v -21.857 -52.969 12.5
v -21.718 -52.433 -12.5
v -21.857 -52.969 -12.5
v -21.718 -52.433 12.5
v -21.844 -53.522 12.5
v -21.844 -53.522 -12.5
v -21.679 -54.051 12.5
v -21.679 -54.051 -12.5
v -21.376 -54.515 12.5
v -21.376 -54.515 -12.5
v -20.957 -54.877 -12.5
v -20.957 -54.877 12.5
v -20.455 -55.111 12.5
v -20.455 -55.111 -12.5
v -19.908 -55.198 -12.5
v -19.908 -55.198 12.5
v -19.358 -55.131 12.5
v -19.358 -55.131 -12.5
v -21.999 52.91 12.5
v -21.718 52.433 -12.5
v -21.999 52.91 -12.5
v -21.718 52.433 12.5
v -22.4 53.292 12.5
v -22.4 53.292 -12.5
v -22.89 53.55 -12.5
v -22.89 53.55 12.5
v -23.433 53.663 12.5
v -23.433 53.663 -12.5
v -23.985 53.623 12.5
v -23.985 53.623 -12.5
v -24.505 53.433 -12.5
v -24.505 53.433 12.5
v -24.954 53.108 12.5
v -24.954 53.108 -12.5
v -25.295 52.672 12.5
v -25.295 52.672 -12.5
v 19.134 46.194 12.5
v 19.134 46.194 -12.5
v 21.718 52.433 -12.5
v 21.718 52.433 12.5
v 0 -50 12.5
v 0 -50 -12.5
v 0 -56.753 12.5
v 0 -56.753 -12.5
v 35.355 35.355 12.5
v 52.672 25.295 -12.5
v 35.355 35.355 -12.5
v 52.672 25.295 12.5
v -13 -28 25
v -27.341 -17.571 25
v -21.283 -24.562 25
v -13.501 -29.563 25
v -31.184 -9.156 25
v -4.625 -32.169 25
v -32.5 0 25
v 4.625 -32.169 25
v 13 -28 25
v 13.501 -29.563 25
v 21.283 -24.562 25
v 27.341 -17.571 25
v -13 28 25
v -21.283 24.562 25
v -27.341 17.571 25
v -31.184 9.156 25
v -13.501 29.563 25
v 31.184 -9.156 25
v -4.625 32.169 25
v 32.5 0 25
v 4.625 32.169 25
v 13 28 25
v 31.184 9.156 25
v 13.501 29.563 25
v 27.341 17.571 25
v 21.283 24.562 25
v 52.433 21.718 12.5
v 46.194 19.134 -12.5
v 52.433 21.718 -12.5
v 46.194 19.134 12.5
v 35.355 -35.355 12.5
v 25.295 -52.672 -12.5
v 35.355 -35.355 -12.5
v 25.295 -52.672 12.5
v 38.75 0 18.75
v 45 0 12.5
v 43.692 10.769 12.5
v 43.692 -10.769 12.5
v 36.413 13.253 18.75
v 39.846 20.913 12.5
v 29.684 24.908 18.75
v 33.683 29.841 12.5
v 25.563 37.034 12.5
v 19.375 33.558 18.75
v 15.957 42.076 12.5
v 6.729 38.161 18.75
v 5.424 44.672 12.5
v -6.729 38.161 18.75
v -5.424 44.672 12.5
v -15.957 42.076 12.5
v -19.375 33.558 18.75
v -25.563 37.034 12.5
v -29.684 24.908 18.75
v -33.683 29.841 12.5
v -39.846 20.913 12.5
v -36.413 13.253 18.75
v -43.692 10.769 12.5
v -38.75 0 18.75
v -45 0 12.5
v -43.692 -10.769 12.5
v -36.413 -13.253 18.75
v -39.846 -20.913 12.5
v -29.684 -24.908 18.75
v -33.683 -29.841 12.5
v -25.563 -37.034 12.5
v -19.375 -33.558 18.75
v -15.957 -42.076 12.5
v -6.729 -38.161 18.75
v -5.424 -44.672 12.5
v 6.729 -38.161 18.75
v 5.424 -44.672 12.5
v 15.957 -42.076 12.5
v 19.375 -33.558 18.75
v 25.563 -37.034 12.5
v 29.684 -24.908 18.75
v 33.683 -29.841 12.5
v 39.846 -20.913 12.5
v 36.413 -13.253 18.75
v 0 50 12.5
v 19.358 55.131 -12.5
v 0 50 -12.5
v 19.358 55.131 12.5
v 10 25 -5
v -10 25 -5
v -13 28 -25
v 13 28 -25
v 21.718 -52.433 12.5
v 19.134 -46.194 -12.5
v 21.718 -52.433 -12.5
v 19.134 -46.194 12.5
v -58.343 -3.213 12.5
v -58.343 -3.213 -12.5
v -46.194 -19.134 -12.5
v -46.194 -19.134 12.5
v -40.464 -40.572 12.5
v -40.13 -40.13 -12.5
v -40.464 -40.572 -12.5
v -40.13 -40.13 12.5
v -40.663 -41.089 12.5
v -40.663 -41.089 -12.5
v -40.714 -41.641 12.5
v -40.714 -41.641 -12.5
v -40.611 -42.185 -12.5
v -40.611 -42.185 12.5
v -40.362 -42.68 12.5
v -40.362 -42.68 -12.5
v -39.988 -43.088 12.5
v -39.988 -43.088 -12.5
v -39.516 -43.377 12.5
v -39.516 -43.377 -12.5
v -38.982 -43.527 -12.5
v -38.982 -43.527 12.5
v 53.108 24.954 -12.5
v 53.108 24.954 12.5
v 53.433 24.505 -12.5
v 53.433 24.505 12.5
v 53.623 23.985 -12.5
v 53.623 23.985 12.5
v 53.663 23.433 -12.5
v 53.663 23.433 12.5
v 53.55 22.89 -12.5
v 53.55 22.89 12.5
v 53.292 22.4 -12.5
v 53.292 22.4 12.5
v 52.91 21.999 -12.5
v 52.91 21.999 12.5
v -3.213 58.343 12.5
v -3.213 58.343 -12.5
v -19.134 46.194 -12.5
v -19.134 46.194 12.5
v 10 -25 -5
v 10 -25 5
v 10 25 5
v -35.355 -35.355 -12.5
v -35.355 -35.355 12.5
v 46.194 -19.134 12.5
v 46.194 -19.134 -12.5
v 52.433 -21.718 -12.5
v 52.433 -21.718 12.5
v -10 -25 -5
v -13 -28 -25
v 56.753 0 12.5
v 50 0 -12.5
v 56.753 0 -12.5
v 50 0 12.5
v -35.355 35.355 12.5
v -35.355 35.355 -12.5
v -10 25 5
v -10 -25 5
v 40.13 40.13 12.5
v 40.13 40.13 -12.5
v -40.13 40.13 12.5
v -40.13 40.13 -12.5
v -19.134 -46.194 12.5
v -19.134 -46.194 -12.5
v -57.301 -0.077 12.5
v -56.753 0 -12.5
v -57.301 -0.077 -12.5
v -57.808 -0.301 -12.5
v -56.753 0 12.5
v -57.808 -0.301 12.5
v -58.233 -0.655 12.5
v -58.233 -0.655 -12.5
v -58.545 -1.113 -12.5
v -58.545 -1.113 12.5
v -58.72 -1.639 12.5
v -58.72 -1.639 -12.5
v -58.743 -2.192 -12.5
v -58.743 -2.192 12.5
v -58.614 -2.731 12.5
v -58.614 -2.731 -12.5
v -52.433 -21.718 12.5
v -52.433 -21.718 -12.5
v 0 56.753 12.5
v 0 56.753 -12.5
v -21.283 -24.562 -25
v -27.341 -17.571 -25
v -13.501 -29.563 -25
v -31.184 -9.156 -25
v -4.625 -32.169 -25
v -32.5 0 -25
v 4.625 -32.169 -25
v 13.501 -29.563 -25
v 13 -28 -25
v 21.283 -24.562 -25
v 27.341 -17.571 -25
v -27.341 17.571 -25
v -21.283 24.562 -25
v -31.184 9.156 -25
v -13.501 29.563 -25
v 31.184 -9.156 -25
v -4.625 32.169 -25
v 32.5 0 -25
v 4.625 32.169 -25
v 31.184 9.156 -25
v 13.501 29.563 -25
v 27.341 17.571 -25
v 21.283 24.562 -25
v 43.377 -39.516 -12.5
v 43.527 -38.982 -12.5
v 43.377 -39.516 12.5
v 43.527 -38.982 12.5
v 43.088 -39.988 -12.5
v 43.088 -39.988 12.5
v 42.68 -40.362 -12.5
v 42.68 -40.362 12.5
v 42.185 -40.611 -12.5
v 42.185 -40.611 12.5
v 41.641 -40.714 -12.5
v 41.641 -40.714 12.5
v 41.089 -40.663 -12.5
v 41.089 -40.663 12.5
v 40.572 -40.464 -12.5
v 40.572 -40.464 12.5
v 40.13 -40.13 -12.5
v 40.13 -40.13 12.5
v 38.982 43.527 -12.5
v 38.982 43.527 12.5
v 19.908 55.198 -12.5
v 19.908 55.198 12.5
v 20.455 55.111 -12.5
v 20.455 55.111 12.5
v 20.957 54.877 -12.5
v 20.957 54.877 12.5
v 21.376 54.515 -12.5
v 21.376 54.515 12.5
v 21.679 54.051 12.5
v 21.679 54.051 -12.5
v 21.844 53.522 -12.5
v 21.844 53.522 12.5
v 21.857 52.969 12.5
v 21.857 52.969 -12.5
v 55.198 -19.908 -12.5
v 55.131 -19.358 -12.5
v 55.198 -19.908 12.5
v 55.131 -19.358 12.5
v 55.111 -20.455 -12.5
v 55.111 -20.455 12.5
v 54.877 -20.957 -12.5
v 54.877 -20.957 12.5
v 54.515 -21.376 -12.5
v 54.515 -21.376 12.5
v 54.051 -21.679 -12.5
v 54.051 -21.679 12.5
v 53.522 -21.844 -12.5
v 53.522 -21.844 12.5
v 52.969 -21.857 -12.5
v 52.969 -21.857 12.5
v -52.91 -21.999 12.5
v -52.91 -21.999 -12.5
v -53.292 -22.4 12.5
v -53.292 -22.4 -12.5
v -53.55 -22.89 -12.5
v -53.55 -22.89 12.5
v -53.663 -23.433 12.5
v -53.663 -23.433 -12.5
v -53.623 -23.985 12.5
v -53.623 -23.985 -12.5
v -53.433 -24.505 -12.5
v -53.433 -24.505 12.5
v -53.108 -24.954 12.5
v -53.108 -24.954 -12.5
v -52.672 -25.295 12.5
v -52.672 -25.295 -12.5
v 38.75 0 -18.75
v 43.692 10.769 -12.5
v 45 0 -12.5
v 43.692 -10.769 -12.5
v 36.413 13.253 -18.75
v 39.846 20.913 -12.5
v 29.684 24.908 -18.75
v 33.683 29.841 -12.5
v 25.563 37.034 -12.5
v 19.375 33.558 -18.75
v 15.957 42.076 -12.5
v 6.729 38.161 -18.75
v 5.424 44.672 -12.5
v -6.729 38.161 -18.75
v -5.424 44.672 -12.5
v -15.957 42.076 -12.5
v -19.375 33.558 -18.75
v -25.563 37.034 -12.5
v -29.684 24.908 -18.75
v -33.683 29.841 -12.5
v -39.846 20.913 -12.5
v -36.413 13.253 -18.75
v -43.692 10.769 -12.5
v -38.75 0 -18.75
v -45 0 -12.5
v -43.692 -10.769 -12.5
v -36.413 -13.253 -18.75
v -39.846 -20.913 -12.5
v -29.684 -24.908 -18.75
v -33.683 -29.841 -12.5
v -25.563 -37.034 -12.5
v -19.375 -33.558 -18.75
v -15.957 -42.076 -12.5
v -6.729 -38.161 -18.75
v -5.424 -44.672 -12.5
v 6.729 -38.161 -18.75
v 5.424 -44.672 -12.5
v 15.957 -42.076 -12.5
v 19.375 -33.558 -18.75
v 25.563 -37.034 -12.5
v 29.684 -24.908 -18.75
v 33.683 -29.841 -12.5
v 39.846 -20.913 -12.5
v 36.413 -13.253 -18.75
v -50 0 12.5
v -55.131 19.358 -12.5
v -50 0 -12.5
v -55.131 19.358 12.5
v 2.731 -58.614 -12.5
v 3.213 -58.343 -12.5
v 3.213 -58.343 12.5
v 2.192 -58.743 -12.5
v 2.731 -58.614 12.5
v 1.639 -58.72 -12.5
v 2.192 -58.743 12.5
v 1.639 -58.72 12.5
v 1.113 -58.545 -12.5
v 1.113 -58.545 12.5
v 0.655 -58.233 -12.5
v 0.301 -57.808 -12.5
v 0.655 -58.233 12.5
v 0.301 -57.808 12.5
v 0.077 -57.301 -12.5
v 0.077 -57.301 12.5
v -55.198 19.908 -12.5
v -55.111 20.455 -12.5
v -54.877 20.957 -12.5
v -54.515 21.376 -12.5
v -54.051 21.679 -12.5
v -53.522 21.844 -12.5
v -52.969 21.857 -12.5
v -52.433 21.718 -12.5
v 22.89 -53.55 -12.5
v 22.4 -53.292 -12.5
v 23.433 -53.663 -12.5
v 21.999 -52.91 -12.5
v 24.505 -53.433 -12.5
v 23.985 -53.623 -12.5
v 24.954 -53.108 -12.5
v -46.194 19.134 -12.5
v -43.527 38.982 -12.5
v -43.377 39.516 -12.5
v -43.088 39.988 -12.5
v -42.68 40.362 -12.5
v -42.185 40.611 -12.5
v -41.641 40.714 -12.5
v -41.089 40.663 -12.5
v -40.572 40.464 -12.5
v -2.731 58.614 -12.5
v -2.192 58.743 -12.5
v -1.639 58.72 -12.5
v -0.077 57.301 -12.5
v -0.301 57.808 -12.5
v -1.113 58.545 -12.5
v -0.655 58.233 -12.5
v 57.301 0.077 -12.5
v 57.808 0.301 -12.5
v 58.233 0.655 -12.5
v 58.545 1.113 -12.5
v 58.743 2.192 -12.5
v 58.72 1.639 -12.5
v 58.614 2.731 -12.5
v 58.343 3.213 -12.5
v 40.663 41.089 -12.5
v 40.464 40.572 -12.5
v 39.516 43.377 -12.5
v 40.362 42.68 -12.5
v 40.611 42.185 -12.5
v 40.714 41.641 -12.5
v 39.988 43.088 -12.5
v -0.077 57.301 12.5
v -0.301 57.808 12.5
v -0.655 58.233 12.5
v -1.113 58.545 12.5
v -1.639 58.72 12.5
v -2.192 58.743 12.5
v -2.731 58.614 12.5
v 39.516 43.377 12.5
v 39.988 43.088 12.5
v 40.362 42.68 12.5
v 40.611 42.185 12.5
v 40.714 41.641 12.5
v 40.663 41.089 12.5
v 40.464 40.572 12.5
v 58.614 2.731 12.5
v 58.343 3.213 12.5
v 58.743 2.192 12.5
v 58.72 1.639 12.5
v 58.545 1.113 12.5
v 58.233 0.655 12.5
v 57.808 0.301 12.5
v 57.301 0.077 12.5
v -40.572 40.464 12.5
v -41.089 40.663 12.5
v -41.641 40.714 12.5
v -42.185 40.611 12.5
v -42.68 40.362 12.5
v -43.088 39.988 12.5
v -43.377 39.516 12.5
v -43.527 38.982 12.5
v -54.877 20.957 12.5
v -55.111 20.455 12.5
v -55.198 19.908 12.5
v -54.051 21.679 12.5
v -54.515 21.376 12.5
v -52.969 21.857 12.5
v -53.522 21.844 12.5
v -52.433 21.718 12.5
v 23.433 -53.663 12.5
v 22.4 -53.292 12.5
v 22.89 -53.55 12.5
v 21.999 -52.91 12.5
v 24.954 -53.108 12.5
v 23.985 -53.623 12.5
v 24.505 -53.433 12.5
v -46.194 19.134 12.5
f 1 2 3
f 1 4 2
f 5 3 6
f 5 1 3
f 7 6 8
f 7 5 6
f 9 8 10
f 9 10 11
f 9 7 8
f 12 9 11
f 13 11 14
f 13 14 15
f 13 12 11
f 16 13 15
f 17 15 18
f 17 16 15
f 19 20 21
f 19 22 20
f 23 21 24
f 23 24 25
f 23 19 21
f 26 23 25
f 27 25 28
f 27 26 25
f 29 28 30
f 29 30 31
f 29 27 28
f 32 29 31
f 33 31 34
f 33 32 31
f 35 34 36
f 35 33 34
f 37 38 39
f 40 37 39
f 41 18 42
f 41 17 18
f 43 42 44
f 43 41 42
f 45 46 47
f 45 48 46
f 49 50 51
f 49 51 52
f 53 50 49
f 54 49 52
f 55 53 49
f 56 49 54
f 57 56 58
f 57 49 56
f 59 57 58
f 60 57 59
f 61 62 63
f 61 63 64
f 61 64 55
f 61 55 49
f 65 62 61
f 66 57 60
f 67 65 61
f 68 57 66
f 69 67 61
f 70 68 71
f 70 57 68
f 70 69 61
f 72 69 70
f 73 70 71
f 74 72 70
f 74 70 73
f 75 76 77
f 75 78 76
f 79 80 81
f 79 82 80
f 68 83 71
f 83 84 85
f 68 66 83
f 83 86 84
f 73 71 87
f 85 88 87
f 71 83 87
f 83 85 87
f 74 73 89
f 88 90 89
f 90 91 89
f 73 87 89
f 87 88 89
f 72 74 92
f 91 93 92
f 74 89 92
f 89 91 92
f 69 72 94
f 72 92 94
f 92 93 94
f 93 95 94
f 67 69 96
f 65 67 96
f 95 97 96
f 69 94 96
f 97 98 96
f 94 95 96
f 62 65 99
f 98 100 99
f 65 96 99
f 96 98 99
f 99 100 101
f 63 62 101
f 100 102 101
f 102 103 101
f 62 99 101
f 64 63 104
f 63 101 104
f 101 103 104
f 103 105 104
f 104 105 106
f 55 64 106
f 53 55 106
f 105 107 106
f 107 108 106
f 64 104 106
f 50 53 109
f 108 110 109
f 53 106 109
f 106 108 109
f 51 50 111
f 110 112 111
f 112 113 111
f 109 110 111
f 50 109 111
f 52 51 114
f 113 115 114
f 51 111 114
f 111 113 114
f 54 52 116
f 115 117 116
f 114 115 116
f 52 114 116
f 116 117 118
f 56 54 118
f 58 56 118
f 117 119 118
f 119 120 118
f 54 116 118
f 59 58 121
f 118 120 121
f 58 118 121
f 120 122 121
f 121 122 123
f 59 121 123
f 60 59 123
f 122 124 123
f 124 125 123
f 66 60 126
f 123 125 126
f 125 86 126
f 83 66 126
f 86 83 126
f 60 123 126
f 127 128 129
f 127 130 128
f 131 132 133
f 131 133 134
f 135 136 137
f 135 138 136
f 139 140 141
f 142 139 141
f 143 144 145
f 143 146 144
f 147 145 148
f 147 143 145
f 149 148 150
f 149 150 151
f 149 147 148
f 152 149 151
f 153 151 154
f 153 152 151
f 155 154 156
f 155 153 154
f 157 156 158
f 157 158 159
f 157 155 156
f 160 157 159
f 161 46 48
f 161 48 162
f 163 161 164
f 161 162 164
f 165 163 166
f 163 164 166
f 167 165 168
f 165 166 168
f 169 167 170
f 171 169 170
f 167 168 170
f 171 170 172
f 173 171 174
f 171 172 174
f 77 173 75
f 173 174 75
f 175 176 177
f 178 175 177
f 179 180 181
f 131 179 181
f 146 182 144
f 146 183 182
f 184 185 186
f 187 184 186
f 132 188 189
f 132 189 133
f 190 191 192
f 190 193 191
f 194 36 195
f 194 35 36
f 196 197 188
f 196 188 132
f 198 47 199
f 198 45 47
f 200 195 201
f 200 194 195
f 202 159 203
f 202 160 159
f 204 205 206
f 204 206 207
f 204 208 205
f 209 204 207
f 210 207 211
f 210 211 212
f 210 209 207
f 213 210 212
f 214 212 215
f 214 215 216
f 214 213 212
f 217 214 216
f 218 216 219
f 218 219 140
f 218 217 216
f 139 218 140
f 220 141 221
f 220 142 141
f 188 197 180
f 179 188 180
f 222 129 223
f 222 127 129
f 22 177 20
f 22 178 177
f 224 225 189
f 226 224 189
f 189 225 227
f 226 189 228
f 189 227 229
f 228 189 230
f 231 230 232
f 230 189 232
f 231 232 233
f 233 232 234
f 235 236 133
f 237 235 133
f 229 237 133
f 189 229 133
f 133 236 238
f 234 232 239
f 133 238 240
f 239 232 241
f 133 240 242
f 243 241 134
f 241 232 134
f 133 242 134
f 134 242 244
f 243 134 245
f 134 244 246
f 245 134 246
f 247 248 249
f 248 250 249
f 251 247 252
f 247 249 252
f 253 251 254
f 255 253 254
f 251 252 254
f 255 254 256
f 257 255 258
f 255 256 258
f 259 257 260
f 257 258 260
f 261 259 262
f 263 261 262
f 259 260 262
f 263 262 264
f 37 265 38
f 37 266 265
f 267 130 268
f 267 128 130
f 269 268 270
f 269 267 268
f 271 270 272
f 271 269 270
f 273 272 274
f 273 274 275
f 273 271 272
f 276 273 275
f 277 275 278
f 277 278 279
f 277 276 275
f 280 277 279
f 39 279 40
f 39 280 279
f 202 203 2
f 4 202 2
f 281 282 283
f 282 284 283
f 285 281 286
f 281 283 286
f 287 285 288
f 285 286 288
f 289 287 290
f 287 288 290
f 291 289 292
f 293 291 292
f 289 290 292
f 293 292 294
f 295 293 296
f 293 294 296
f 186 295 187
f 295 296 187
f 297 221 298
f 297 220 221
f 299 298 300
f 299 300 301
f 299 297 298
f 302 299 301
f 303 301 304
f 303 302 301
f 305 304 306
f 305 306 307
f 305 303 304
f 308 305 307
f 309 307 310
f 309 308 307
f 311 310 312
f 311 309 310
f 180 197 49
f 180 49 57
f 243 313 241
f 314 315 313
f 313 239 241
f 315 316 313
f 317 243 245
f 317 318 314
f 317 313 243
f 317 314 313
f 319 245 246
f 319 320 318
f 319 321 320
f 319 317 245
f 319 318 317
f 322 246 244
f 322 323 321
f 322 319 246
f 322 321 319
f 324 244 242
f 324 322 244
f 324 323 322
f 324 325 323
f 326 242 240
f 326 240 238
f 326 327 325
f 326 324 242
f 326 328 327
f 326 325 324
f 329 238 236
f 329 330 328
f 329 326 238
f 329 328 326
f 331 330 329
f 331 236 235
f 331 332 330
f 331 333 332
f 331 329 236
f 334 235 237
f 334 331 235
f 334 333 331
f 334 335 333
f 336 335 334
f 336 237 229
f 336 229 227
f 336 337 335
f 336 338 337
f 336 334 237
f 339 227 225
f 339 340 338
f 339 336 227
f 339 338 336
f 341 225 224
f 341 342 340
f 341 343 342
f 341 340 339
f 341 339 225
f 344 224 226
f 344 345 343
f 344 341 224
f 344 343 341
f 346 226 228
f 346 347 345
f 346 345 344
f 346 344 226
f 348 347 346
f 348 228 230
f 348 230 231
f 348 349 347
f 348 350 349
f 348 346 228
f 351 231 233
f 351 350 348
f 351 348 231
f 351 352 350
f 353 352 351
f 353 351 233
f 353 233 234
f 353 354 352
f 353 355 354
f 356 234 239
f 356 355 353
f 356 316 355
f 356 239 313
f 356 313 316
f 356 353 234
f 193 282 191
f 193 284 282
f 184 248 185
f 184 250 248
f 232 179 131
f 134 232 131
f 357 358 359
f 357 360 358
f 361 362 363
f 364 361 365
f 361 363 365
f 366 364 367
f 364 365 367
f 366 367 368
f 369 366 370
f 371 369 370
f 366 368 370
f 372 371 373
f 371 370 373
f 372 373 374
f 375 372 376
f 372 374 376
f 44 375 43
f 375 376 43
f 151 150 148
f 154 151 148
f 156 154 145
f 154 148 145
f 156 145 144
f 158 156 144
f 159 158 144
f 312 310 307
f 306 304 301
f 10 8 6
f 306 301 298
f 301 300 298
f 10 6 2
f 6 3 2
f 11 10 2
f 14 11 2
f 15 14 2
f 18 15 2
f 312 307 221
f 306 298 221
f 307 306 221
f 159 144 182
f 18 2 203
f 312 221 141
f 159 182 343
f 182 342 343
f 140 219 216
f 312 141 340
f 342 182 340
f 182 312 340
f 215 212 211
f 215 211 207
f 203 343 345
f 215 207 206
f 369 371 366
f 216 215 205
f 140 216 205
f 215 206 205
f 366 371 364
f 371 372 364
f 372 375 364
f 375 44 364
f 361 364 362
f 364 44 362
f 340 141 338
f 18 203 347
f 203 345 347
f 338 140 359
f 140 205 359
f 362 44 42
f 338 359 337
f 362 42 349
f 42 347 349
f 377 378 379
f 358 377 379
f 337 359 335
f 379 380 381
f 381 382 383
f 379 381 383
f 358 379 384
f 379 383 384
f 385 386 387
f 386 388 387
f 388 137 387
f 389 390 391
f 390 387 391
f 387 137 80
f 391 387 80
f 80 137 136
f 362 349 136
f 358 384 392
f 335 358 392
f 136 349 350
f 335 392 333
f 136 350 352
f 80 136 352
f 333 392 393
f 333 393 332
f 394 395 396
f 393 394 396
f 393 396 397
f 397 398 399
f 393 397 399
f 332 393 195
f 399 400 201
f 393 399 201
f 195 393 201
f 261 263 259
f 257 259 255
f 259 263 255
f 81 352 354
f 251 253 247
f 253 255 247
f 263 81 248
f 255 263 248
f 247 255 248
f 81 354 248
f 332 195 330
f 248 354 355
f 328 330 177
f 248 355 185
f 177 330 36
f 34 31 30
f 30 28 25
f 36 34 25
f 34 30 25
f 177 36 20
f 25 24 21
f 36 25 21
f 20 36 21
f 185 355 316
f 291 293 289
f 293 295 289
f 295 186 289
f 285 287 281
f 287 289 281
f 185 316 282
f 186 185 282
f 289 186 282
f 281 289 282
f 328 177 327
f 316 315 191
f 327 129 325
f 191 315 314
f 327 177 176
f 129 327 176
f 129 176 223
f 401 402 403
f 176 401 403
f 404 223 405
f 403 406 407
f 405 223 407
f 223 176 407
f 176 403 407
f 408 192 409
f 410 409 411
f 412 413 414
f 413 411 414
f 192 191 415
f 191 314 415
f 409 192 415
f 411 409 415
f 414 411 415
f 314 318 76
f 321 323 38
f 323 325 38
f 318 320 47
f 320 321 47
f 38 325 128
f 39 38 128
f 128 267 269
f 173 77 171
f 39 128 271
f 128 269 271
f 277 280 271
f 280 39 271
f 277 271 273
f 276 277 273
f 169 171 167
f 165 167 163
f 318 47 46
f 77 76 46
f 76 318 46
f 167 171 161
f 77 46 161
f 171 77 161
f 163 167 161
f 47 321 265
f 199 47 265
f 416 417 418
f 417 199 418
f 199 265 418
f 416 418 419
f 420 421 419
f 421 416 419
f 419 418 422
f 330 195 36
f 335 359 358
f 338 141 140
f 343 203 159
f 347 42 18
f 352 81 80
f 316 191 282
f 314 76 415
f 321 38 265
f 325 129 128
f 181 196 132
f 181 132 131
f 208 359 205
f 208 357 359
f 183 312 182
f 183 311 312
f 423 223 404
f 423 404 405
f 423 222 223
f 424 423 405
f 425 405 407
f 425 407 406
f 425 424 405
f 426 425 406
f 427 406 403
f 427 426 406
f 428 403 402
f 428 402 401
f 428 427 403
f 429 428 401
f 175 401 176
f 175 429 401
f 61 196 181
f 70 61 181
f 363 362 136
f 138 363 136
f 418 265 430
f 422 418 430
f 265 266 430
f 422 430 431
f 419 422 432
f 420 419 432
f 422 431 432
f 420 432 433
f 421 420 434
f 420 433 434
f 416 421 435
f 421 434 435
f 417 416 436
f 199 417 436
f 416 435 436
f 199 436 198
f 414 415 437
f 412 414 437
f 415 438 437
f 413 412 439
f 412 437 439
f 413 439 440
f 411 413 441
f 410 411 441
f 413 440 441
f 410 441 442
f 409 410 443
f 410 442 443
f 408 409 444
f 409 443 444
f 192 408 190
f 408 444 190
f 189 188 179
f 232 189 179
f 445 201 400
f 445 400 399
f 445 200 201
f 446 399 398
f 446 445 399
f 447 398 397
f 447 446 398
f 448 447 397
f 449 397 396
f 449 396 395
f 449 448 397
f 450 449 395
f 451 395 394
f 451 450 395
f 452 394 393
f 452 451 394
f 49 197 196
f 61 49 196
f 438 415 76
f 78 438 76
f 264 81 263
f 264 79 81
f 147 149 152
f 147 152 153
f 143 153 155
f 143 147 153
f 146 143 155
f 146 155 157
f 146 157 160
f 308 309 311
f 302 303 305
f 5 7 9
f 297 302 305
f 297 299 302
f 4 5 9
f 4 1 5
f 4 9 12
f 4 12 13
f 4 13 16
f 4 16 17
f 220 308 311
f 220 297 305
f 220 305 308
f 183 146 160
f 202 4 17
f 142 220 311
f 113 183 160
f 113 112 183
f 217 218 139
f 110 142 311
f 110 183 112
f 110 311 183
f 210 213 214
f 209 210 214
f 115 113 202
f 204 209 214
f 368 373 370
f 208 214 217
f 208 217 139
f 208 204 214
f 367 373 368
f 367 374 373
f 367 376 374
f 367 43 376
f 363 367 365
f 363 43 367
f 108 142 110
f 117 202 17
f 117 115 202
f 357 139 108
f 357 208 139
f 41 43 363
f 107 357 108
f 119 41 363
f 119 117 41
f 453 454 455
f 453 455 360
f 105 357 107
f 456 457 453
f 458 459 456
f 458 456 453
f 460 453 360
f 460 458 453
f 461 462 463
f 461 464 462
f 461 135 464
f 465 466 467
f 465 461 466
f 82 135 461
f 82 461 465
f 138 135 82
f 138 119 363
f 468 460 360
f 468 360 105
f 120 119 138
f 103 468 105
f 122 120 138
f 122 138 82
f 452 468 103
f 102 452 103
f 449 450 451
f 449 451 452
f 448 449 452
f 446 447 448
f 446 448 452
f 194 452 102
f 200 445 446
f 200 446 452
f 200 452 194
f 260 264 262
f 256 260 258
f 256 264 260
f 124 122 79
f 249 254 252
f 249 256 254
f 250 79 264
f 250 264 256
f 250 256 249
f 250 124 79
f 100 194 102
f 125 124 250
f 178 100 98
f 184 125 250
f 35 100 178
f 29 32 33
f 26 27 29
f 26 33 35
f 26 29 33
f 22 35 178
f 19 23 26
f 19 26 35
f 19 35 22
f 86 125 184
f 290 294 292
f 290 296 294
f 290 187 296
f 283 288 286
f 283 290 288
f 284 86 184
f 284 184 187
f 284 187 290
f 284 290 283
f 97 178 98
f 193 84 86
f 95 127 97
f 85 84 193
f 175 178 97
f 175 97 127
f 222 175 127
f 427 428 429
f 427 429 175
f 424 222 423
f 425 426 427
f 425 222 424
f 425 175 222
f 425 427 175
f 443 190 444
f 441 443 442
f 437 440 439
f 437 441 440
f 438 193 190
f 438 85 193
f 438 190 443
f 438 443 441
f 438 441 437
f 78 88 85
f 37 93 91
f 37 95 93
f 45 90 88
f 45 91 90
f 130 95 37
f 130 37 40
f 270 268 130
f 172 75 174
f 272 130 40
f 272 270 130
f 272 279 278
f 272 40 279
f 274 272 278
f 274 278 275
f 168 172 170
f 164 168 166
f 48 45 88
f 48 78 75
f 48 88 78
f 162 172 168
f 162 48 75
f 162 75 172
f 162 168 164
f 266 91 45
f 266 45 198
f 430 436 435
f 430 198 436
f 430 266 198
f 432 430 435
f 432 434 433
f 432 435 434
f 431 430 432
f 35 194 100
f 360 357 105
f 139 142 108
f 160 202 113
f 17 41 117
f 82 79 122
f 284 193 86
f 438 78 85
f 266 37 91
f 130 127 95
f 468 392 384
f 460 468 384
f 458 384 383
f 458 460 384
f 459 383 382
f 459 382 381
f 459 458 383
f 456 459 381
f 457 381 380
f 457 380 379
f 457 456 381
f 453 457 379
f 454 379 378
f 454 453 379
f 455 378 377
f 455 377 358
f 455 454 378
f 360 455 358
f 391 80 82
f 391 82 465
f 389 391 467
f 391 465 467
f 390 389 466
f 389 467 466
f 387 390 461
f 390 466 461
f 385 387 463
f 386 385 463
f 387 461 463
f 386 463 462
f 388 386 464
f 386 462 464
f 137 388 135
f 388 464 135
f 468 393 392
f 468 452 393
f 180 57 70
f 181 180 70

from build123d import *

# Parameters (mm, degrees)
F0_R       = 45
F0_W       = 20
F0_H       = 50
F1_DEPTH   = 12.5
F2_DEPTH   = 25
F3_SIZE2   = 12.49999
F3_SIZE    = 12.49999
F4_SIZE    = 12.49999
F5_R       = 2
F6_SIZE2   = 20
F6_SIZE    = 3
F6_2_SIZE2 = 20
F6_2_SIZE  = 3
F7_SIZE2   = 3
F7_SIZE    = 20


# Not quite as in the source:
# - a fillet or chamfer is up to 0.001 mm smaller than in the source, because OpenCascade refuses the exact size


with BuildPart() as f1:
    # F0 (on Top) → F1 (new body, symmetric)
    with BuildSketch(Plane.XY):
        Polygon((46.1939766256, -19.1341716183), (50, 0), (46.1939766256, 19.1341716183), (35.3553390593, 35.3553390593), (19.1341716183, 46.1939766256), (0, 50), (-19.1341716183, 46.1939766256), (-35.3553390593, 35.3553390593), (-46.1939766256, 19.1341716183), (-50, 0), (-46.1939766256, -19.1341716183), (-35.3553390593, -35.3553390593), (-19.1341716183, -46.1939766256), (0, -50), (19.1341716183, -46.1939766256), (35.3553390593, -35.3553390593), align=None)
        Circle(F0_R, mode=Mode.SUBTRACT)
        Circle(F0_R)
        Rectangle(F0_W, F0_H, mode=Mode.SUBTRACT)
        Polygon((-19.1341716183, 46.1939766256), (0, 50), (0, 60.7945092961), align=None)
        Polygon((-35.3553390593, 35.3553390593), (-19.1341716183, 46.1939766256), (-23.2650514864, 56.1668028277), align=None)
        Polygon((-46.1939766256, 19.1341716183), (-35.3553390593, 35.3553390593), (-42.9882097822, 42.9882097822), align=None)
        Polygon((-50, 0), (-46.1939766256, 19.1341716183), (-56.1668028277, 23.2650514864), align=None)
        Polygon((-60.7945092961, 0), (-46.1939766256, -19.1341716183), (-50, 0), align=None)
        Polygon((-56.1668028277, -23.2650514864), (-35.3553390593, -35.3553390593), (-46.1939766256, -19.1341716183), align=None)
        Polygon((-42.9882097822, -42.9882097822), (-19.1341716183, -46.1939766256), (-35.3553390593, -35.3553390593), align=None)
        Polygon((-23.2650514864, -56.1668028277), (0, -50), (-19.1341716183, -46.1939766256), align=None)
        Polygon((0, -60.7945092961), (19.1341716183, -46.1939766256), (0, -50), align=None)
        Polygon((23.2650514864, -56.1668028277), (35.3553390593, -35.3553390593), (19.1341716183, -46.1939766256), align=None)
        Polygon((42.9882097822, -42.9882097822), (46.1939766256, -19.1341716183), (35.3553390593, -35.3553390593), align=None)
        Polygon((56.1668028277, -23.2650514864), (50, 0), (46.1939766256, -19.1341716183), align=None)
        Polygon((46.1939766256, 19.1341716183), (50, 0), (60.7945092961, 0), align=None)
        Polygon((35.3553390593, 35.3553390593), (46.1939766256, 19.1341716183), (56.1668028277, 23.2650514864), align=None)
        Polygon((19.1341716183, 46.1939766256), (35.3553390593, 35.3553390593), (42.9882097822, 42.9882097822), align=None)
        Polygon((0, 50), (19.1341716183, 46.1939766256), (23.2650514864, 56.1668028277), align=None)
    extrude(amount=F1_DEPTH, both=True)

    # F0 (on Top) → F2 (join, symmetric)
    with BuildSketch(Plane.XY):
        Circle(F0_R)
        Rectangle(F0_W, F0_H, mode=Mode.SUBTRACT)
    extrude(amount=F2_DEPTH, both=True)

    # F3 (size 12.5 and 12.5 in the source; OpenCascade refuses exactly that, so slightly less here)
    f3_edges = [f1.edges().sort_by_distance(p)[0] for p in [
        (-45, 0, 25),
    ]]
    chamfer(f3_edges, length=F3_SIZE, length2=F3_SIZE2)

    # F4 (size 12.5 in the source; OpenCascade refuses exactly that, so slightly less here)
    f4_edges = [f1.edges().sort_by_distance(p)[0] for p in [
        (-45, 0, -25),
    ]]
    chamfer(f4_edges, length=F4_SIZE)

    # F5
    f5_edges = [f1.edges().sort_by_distance(p)[0] for p in [
        (23.265051, 56.166803, 0),
        (0, 60.794509, 0),
        (-23.265051, 56.166803, 0),
        (-42.98821, 42.98821, 0),
        (-56.166803, 23.265051, 0),
        (-60.794509, 0, 0),
        (-56.166803, -23.265051, 0),
        (-42.98821, -42.98821, 0),
        (-23.265051, -56.166803, 0),
        (0, -60.794509, 0),
        (23.265051, -56.166803, 0),
        (42.98821, 42.98821, 0),
        (56.166803, 23.265051, 0),
        (60.794509, 0, 0),
        (56.166803, -23.265051, 0),
        (42.98821, -42.98821, 0),
    ]]
    fillet(f5_edges, radius=F5_R)

    # F6
    f6_edges = [f1.edges().sort_by_distance(p)[0] for p in [
        (0, 25, -25),
        (-10, 0, -25),
        (10, 0, -25),
        (0, -25, -25),
    ]]
    f6_side = f1.faces().sort_by_distance((-31.580771, 0, -25))[0]
    chamfer(f6_edges, length=F6_SIZE, length2=F6_SIZE2, reference=f6_side)

    # F6#2
    f6_2_edges = [f1.edges().sort_by_distance(p)[0] for p in [
        (-10, 0, 25),
        (0, -25, 25),
        (0, 25, 25),
    ]]
    f6_2_side = f1.faces().sort_by_distance((-31.580771, 0, 25))[0]
    chamfer(f6_2_edges, length=F6_2_SIZE, length2=F6_2_SIZE2, reference=f6_2_side)

    # F7
    f7_edges = [f1.edges().sort_by_distance(p)[0] for p in [
        (10, 0, 25),
    ]]
    f7_side = f1.faces().sort_by_distance((10, 0, 10.320513))[0]
    chamfer(f7_edges, length=F7_SIZE, length2=F7_SIZE2, reference=f7_side)


solid = f1.part
